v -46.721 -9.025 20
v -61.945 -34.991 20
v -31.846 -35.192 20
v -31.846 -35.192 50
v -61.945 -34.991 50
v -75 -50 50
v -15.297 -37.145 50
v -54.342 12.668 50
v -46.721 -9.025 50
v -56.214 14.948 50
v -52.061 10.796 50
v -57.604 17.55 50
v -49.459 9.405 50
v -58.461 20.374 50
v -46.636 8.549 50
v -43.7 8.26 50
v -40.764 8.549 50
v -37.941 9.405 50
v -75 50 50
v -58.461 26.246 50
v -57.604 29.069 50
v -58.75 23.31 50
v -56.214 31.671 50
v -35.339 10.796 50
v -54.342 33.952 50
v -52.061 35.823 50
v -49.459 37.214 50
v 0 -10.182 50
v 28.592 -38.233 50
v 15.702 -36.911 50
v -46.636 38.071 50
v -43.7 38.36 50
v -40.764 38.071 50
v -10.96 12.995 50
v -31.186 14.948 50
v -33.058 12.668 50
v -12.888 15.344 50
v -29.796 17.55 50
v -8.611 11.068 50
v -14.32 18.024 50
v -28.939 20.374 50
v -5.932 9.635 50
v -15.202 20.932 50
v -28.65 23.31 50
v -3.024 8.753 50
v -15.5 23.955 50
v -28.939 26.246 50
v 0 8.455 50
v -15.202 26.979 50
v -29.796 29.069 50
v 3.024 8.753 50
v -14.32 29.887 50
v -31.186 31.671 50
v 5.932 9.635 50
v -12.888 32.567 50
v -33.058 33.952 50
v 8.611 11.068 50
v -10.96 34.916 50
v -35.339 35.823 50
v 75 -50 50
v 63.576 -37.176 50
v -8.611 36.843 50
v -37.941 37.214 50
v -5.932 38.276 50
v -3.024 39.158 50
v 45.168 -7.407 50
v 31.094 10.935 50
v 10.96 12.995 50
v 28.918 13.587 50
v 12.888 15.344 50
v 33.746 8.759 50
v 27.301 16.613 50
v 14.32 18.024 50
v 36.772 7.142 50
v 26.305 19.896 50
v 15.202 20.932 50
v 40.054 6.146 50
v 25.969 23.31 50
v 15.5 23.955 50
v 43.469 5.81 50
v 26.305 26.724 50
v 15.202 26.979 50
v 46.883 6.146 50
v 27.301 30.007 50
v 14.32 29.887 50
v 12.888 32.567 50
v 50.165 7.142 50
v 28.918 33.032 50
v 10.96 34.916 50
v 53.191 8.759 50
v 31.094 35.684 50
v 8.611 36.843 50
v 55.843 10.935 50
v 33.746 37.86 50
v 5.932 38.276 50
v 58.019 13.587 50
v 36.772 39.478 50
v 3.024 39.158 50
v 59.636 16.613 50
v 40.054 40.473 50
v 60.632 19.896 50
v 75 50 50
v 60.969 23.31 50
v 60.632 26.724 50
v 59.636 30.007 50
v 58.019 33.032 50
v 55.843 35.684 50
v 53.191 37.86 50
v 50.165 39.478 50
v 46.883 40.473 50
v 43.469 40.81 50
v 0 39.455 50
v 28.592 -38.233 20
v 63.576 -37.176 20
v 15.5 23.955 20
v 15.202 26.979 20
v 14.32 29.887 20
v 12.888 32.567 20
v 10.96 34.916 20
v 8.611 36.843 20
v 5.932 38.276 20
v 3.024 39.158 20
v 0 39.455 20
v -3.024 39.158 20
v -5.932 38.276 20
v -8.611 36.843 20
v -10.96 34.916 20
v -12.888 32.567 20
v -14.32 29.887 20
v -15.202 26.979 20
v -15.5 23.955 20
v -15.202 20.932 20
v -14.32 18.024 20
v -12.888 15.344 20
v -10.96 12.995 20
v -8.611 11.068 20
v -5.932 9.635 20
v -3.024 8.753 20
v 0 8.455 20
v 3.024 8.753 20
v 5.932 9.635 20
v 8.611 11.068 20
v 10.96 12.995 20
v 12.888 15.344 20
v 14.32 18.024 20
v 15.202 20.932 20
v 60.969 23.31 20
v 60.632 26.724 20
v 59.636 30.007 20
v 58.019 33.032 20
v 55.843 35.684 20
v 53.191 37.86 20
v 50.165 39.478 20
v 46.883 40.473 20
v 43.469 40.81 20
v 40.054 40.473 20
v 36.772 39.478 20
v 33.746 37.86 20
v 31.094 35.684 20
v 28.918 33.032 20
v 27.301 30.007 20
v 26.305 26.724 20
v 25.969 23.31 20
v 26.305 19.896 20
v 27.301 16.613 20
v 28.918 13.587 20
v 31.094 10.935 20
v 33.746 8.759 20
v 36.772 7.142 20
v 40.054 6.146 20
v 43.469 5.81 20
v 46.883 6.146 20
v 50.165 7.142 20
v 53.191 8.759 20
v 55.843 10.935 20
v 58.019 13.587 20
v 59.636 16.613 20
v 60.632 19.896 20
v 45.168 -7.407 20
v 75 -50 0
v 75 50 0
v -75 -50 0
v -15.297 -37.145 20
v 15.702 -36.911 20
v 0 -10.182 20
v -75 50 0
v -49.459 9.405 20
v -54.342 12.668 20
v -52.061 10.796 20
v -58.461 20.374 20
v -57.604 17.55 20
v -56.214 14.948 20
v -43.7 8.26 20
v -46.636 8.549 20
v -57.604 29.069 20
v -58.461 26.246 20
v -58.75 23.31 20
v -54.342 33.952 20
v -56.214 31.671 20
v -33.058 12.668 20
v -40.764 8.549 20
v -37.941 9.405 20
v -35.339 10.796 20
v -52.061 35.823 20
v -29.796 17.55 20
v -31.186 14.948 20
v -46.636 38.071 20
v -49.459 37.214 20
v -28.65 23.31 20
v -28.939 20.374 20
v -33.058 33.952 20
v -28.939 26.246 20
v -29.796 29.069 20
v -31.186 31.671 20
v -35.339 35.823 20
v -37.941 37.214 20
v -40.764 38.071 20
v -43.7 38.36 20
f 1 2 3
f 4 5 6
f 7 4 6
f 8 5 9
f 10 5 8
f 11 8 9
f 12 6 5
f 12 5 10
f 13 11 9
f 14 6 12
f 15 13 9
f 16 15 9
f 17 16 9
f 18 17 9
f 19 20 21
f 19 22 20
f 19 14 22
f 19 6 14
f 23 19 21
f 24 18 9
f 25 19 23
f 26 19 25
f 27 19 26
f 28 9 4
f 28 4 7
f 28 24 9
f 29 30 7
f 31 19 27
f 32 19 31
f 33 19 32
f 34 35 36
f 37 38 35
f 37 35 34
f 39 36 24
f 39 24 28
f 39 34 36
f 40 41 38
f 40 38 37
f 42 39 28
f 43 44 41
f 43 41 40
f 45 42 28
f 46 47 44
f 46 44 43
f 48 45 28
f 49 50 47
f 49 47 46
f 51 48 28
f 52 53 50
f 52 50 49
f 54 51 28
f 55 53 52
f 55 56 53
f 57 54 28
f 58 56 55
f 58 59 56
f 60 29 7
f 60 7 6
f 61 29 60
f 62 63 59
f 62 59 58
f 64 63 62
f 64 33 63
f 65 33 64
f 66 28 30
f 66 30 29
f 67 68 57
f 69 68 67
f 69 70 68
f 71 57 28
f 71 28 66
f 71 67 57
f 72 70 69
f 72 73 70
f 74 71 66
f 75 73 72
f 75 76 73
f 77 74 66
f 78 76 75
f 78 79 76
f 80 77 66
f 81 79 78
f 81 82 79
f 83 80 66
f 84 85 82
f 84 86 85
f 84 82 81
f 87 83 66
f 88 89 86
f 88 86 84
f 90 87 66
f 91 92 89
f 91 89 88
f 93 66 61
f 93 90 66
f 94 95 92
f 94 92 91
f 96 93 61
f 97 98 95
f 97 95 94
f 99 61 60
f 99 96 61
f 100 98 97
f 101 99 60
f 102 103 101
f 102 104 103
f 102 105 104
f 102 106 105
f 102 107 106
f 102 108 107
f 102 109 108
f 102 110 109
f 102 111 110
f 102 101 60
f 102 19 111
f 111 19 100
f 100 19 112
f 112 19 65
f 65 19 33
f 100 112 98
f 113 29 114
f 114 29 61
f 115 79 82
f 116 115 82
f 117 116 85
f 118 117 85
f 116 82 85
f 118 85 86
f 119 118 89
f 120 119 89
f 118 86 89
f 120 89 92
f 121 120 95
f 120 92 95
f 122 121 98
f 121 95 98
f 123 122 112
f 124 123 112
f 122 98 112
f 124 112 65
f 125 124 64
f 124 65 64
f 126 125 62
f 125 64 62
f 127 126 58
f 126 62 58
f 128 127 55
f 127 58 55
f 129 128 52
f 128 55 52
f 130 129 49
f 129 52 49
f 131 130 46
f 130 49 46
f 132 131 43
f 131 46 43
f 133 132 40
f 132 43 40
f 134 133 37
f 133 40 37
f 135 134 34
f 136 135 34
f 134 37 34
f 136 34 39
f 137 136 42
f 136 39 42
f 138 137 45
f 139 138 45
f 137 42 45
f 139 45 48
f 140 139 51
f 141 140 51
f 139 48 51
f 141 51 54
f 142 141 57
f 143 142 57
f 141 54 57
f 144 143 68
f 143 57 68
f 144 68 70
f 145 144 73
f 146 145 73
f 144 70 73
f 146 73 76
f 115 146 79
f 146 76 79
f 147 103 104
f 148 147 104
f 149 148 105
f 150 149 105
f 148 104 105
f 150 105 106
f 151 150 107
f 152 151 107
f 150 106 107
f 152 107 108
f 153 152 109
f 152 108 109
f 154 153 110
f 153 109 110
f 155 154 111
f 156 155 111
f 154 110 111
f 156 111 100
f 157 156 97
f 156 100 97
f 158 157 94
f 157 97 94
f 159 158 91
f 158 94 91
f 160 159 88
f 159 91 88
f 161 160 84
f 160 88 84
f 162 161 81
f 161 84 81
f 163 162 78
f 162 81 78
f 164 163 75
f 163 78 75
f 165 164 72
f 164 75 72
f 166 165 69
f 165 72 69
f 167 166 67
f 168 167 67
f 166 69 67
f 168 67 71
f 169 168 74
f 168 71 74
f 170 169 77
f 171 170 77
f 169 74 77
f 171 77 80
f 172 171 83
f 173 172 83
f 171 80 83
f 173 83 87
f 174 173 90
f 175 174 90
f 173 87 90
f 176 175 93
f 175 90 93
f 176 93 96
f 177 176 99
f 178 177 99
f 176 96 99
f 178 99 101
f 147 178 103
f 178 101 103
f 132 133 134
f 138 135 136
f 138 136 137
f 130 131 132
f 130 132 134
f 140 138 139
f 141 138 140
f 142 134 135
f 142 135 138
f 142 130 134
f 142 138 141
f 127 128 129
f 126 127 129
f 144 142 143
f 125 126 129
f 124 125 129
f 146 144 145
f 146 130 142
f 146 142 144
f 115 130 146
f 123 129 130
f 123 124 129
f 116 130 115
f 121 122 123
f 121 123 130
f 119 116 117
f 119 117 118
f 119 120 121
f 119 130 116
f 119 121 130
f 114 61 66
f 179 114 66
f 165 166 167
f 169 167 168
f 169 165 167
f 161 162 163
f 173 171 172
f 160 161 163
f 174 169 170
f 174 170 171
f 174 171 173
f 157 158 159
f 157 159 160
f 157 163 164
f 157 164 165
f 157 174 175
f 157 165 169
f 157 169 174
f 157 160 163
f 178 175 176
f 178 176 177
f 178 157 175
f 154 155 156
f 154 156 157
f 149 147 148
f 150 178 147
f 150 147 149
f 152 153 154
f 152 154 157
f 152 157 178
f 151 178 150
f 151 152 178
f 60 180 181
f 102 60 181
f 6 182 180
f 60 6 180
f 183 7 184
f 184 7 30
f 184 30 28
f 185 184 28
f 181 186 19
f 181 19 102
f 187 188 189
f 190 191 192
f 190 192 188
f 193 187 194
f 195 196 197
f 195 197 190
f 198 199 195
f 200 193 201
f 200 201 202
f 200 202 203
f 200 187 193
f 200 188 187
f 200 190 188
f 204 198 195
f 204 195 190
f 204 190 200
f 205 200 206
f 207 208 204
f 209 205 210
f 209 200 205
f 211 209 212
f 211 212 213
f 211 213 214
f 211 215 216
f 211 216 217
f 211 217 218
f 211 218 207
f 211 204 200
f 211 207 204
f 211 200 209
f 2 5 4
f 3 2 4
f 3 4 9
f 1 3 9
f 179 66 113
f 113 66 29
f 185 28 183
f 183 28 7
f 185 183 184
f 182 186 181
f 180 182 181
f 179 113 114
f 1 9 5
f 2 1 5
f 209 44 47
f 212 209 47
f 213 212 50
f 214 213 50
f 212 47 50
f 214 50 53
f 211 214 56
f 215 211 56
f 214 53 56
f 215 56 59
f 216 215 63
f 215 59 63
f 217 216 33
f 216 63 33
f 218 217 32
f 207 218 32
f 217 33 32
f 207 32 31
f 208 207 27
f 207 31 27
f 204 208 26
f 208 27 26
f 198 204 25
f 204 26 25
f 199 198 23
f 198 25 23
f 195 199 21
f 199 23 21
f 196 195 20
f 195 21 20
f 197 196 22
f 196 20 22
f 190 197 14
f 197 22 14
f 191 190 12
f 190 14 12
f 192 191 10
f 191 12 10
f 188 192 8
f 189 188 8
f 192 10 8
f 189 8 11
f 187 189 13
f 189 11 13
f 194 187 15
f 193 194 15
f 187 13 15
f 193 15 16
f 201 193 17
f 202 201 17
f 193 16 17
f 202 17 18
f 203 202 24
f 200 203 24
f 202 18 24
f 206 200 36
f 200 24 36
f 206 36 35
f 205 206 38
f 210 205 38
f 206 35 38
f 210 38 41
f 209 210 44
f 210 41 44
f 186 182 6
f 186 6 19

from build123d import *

# Parameters (mm, degrees)
F0_W     = 150
F0_H     = 100
F1_DEPTH = 50
F2_R     = 15.05
F2_R_2   = 15.5
F2_R_3   = 17.5
F3_DEPTH = 30


with BuildPart() as f1:
    # F0 (on Top) → F1 (new body)
    with BuildSketch(Plane.XY):
        Rectangle(F0_W, F0_H)
    extrude(amount=F1_DEPTH)

    # F2 (on face) → F3 (cut)
    with BuildSketch(Plane.XY.offset(50)):
        with Locations((-43.700065, 23.309725)):
            Circle(F2_R)
        with Locations((0, 23.955417)):
            Circle(F2_R_2)
        with Locations((43.468519, 23.309725)):
            Circle(F2_R_3)
        Polygon((-61.944879, -34.990932), (-31.845553, -35.192401), (-46.720739, -9.024886), align=None)
        Polygon((-15.296724, -37.1452), (15.702391, -36.910988), (0, -10.182073), align=None)
        Polygon((28.591996, -38.232997), (63.57602, -37.175601), (45.168276, -7.407246), align=None)
    extrude(amount=-F3_DEPTH, mode=Mode.SUBTRACT)


solid = f1.part
